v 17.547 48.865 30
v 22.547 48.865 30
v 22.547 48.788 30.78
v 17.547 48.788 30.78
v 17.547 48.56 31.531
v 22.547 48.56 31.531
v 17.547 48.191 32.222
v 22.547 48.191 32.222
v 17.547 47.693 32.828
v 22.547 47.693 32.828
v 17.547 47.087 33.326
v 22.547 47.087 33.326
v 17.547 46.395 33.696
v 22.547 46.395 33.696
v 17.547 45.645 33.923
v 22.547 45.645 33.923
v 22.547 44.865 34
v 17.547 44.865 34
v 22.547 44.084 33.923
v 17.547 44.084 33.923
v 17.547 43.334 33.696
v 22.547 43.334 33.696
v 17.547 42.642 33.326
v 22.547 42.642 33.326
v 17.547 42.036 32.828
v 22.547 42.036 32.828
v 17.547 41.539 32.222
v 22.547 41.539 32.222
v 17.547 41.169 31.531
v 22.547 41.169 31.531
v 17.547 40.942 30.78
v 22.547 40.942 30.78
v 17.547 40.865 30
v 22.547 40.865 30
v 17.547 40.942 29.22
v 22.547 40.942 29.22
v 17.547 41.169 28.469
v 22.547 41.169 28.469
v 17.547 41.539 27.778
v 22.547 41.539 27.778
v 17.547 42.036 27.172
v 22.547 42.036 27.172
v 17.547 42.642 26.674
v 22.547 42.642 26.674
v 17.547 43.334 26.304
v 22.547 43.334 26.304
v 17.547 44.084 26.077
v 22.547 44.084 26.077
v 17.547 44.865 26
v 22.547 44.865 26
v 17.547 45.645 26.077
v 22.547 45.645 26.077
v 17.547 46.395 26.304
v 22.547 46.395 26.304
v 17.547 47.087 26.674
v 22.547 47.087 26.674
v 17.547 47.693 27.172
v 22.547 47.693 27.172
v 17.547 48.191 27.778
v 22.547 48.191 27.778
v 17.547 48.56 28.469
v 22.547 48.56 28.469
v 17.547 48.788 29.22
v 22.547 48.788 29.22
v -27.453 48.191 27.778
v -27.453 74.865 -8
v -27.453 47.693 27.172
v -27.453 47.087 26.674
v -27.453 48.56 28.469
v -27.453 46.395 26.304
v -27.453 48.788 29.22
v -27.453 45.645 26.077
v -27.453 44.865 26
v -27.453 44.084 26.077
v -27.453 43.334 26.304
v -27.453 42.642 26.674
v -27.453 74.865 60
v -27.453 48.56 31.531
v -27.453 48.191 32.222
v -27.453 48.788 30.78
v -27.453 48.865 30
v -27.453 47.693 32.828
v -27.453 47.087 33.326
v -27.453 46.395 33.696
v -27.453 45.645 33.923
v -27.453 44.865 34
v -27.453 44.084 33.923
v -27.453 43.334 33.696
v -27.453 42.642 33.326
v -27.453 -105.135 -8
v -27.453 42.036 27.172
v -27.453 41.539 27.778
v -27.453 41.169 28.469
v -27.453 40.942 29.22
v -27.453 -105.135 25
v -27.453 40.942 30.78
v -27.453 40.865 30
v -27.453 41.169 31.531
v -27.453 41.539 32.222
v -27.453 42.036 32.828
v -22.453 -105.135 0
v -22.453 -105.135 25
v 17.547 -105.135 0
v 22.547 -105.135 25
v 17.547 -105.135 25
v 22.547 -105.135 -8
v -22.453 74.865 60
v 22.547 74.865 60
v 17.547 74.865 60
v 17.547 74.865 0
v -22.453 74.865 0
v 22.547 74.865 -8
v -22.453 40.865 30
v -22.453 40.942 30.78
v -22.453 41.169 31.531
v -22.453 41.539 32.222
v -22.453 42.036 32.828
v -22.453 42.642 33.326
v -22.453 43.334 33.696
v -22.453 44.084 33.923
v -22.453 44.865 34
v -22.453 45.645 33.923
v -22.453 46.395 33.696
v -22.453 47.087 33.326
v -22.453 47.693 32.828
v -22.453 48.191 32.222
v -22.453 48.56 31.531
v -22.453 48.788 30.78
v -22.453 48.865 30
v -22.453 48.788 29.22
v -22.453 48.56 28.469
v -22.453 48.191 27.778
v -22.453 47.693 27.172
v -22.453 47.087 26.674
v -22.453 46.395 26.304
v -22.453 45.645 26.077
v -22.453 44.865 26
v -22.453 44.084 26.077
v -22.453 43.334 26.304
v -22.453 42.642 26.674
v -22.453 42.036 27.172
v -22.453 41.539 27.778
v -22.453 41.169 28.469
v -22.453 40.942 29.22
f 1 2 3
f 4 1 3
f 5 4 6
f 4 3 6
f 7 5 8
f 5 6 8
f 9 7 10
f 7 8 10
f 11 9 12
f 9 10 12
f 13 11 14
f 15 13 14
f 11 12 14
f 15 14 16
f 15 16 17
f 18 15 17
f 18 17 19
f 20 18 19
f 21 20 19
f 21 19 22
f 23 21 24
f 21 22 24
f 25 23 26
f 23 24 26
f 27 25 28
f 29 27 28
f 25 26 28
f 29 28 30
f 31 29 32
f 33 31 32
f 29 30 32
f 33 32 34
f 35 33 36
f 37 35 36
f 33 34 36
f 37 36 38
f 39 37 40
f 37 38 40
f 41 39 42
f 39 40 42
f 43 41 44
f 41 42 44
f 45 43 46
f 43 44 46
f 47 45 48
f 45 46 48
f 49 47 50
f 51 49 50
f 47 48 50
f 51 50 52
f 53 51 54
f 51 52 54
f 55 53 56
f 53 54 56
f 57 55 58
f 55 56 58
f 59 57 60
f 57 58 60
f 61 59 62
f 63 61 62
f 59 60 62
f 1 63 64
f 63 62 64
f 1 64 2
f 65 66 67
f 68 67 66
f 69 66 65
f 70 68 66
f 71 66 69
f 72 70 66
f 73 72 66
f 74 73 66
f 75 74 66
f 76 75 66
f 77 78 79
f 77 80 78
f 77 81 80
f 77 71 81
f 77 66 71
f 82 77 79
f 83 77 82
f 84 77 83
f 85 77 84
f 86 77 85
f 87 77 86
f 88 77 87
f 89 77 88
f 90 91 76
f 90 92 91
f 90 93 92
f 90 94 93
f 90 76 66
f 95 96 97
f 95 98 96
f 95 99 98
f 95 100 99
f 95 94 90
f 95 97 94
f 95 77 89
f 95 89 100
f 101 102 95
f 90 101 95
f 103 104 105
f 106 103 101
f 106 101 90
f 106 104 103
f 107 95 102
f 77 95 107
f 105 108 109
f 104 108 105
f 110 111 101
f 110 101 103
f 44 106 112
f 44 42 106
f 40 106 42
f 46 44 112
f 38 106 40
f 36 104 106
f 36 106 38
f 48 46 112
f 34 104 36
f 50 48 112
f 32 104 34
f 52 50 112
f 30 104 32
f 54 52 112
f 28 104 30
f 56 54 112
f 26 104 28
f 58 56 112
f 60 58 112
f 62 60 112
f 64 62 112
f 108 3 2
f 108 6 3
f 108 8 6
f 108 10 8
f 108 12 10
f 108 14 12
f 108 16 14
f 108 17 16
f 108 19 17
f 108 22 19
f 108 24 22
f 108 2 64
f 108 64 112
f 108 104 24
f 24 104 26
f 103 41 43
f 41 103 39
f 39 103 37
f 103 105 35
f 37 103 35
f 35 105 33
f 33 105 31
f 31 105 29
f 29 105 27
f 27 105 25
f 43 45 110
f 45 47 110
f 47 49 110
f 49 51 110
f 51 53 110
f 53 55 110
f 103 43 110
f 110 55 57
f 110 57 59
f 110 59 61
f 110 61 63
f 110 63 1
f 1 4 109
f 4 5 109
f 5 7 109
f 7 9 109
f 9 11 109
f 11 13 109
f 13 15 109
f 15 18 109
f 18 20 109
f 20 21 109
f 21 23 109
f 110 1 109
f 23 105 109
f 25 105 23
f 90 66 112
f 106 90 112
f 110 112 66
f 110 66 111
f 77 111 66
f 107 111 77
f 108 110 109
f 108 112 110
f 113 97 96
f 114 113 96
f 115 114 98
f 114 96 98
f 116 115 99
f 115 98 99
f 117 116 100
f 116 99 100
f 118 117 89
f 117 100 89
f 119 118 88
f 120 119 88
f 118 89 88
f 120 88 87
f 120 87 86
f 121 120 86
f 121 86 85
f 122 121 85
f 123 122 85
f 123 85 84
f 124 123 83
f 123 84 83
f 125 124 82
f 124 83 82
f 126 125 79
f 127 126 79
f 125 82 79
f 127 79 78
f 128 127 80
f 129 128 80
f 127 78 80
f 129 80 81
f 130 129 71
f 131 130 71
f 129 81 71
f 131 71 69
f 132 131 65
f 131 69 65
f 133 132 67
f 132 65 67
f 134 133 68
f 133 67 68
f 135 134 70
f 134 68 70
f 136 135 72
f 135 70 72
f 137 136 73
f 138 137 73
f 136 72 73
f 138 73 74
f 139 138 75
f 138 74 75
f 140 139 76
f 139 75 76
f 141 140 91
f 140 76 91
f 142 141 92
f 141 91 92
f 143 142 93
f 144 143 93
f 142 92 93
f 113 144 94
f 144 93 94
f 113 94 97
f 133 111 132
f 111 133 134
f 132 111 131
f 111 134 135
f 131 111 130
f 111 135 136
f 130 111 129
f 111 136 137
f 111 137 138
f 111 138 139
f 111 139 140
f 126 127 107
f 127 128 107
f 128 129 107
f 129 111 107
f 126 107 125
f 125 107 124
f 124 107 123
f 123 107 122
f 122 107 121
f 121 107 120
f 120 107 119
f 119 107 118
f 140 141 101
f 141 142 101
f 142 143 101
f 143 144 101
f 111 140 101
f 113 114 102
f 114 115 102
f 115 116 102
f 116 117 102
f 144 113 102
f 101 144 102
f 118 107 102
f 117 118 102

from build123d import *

# Parameters (mm, degrees)
F0_W     = 50
F0_H     = 180
F1_DEPTH = 8
F2_R     = 4
F3_DEPTH = 5
F4_R     = 4
F5_DEPTH = 5


with BuildPart() as f1:
    # F0 (on Top) → F1 (new body)
    with BuildSketch(Plane.XY):
        with Locations((-2.453425, -15.13525)):
            Rectangle(F0_W, F0_H)
    extrude(amount=-F1_DEPTH)

    # F2 (on face) → F3 (join)
    with BuildSketch(Plane(origin=(-27.453425, 0, 0), x_dir=(0, -1, 0), z_dir=(-1, 0, 0))):
        Polygon((-74.86475, 60), (-74.86475, 0), (105.13525, 0), (105.13525, 25), align=None)
        with Locations((-44.86475, 30)):
            Circle(F2_R, mode=Mode.SUBTRACT)
    extrude(amount=-F3_DEPTH)

    # F4 (on face) → F5 (join)
    with BuildSketch(Plane.YZ.offset(22.546575)):
        Polygon((-105.13525, 25), (-105.13525, 0), (74.86475, 0), (74.86475, 60), align=None)
        with Locations((44.86475, 30)):
            Circle(F4_R, mode=Mode.SUBTRACT)
    extrude(amount=-F5_DEPTH)


solid = f1.part
